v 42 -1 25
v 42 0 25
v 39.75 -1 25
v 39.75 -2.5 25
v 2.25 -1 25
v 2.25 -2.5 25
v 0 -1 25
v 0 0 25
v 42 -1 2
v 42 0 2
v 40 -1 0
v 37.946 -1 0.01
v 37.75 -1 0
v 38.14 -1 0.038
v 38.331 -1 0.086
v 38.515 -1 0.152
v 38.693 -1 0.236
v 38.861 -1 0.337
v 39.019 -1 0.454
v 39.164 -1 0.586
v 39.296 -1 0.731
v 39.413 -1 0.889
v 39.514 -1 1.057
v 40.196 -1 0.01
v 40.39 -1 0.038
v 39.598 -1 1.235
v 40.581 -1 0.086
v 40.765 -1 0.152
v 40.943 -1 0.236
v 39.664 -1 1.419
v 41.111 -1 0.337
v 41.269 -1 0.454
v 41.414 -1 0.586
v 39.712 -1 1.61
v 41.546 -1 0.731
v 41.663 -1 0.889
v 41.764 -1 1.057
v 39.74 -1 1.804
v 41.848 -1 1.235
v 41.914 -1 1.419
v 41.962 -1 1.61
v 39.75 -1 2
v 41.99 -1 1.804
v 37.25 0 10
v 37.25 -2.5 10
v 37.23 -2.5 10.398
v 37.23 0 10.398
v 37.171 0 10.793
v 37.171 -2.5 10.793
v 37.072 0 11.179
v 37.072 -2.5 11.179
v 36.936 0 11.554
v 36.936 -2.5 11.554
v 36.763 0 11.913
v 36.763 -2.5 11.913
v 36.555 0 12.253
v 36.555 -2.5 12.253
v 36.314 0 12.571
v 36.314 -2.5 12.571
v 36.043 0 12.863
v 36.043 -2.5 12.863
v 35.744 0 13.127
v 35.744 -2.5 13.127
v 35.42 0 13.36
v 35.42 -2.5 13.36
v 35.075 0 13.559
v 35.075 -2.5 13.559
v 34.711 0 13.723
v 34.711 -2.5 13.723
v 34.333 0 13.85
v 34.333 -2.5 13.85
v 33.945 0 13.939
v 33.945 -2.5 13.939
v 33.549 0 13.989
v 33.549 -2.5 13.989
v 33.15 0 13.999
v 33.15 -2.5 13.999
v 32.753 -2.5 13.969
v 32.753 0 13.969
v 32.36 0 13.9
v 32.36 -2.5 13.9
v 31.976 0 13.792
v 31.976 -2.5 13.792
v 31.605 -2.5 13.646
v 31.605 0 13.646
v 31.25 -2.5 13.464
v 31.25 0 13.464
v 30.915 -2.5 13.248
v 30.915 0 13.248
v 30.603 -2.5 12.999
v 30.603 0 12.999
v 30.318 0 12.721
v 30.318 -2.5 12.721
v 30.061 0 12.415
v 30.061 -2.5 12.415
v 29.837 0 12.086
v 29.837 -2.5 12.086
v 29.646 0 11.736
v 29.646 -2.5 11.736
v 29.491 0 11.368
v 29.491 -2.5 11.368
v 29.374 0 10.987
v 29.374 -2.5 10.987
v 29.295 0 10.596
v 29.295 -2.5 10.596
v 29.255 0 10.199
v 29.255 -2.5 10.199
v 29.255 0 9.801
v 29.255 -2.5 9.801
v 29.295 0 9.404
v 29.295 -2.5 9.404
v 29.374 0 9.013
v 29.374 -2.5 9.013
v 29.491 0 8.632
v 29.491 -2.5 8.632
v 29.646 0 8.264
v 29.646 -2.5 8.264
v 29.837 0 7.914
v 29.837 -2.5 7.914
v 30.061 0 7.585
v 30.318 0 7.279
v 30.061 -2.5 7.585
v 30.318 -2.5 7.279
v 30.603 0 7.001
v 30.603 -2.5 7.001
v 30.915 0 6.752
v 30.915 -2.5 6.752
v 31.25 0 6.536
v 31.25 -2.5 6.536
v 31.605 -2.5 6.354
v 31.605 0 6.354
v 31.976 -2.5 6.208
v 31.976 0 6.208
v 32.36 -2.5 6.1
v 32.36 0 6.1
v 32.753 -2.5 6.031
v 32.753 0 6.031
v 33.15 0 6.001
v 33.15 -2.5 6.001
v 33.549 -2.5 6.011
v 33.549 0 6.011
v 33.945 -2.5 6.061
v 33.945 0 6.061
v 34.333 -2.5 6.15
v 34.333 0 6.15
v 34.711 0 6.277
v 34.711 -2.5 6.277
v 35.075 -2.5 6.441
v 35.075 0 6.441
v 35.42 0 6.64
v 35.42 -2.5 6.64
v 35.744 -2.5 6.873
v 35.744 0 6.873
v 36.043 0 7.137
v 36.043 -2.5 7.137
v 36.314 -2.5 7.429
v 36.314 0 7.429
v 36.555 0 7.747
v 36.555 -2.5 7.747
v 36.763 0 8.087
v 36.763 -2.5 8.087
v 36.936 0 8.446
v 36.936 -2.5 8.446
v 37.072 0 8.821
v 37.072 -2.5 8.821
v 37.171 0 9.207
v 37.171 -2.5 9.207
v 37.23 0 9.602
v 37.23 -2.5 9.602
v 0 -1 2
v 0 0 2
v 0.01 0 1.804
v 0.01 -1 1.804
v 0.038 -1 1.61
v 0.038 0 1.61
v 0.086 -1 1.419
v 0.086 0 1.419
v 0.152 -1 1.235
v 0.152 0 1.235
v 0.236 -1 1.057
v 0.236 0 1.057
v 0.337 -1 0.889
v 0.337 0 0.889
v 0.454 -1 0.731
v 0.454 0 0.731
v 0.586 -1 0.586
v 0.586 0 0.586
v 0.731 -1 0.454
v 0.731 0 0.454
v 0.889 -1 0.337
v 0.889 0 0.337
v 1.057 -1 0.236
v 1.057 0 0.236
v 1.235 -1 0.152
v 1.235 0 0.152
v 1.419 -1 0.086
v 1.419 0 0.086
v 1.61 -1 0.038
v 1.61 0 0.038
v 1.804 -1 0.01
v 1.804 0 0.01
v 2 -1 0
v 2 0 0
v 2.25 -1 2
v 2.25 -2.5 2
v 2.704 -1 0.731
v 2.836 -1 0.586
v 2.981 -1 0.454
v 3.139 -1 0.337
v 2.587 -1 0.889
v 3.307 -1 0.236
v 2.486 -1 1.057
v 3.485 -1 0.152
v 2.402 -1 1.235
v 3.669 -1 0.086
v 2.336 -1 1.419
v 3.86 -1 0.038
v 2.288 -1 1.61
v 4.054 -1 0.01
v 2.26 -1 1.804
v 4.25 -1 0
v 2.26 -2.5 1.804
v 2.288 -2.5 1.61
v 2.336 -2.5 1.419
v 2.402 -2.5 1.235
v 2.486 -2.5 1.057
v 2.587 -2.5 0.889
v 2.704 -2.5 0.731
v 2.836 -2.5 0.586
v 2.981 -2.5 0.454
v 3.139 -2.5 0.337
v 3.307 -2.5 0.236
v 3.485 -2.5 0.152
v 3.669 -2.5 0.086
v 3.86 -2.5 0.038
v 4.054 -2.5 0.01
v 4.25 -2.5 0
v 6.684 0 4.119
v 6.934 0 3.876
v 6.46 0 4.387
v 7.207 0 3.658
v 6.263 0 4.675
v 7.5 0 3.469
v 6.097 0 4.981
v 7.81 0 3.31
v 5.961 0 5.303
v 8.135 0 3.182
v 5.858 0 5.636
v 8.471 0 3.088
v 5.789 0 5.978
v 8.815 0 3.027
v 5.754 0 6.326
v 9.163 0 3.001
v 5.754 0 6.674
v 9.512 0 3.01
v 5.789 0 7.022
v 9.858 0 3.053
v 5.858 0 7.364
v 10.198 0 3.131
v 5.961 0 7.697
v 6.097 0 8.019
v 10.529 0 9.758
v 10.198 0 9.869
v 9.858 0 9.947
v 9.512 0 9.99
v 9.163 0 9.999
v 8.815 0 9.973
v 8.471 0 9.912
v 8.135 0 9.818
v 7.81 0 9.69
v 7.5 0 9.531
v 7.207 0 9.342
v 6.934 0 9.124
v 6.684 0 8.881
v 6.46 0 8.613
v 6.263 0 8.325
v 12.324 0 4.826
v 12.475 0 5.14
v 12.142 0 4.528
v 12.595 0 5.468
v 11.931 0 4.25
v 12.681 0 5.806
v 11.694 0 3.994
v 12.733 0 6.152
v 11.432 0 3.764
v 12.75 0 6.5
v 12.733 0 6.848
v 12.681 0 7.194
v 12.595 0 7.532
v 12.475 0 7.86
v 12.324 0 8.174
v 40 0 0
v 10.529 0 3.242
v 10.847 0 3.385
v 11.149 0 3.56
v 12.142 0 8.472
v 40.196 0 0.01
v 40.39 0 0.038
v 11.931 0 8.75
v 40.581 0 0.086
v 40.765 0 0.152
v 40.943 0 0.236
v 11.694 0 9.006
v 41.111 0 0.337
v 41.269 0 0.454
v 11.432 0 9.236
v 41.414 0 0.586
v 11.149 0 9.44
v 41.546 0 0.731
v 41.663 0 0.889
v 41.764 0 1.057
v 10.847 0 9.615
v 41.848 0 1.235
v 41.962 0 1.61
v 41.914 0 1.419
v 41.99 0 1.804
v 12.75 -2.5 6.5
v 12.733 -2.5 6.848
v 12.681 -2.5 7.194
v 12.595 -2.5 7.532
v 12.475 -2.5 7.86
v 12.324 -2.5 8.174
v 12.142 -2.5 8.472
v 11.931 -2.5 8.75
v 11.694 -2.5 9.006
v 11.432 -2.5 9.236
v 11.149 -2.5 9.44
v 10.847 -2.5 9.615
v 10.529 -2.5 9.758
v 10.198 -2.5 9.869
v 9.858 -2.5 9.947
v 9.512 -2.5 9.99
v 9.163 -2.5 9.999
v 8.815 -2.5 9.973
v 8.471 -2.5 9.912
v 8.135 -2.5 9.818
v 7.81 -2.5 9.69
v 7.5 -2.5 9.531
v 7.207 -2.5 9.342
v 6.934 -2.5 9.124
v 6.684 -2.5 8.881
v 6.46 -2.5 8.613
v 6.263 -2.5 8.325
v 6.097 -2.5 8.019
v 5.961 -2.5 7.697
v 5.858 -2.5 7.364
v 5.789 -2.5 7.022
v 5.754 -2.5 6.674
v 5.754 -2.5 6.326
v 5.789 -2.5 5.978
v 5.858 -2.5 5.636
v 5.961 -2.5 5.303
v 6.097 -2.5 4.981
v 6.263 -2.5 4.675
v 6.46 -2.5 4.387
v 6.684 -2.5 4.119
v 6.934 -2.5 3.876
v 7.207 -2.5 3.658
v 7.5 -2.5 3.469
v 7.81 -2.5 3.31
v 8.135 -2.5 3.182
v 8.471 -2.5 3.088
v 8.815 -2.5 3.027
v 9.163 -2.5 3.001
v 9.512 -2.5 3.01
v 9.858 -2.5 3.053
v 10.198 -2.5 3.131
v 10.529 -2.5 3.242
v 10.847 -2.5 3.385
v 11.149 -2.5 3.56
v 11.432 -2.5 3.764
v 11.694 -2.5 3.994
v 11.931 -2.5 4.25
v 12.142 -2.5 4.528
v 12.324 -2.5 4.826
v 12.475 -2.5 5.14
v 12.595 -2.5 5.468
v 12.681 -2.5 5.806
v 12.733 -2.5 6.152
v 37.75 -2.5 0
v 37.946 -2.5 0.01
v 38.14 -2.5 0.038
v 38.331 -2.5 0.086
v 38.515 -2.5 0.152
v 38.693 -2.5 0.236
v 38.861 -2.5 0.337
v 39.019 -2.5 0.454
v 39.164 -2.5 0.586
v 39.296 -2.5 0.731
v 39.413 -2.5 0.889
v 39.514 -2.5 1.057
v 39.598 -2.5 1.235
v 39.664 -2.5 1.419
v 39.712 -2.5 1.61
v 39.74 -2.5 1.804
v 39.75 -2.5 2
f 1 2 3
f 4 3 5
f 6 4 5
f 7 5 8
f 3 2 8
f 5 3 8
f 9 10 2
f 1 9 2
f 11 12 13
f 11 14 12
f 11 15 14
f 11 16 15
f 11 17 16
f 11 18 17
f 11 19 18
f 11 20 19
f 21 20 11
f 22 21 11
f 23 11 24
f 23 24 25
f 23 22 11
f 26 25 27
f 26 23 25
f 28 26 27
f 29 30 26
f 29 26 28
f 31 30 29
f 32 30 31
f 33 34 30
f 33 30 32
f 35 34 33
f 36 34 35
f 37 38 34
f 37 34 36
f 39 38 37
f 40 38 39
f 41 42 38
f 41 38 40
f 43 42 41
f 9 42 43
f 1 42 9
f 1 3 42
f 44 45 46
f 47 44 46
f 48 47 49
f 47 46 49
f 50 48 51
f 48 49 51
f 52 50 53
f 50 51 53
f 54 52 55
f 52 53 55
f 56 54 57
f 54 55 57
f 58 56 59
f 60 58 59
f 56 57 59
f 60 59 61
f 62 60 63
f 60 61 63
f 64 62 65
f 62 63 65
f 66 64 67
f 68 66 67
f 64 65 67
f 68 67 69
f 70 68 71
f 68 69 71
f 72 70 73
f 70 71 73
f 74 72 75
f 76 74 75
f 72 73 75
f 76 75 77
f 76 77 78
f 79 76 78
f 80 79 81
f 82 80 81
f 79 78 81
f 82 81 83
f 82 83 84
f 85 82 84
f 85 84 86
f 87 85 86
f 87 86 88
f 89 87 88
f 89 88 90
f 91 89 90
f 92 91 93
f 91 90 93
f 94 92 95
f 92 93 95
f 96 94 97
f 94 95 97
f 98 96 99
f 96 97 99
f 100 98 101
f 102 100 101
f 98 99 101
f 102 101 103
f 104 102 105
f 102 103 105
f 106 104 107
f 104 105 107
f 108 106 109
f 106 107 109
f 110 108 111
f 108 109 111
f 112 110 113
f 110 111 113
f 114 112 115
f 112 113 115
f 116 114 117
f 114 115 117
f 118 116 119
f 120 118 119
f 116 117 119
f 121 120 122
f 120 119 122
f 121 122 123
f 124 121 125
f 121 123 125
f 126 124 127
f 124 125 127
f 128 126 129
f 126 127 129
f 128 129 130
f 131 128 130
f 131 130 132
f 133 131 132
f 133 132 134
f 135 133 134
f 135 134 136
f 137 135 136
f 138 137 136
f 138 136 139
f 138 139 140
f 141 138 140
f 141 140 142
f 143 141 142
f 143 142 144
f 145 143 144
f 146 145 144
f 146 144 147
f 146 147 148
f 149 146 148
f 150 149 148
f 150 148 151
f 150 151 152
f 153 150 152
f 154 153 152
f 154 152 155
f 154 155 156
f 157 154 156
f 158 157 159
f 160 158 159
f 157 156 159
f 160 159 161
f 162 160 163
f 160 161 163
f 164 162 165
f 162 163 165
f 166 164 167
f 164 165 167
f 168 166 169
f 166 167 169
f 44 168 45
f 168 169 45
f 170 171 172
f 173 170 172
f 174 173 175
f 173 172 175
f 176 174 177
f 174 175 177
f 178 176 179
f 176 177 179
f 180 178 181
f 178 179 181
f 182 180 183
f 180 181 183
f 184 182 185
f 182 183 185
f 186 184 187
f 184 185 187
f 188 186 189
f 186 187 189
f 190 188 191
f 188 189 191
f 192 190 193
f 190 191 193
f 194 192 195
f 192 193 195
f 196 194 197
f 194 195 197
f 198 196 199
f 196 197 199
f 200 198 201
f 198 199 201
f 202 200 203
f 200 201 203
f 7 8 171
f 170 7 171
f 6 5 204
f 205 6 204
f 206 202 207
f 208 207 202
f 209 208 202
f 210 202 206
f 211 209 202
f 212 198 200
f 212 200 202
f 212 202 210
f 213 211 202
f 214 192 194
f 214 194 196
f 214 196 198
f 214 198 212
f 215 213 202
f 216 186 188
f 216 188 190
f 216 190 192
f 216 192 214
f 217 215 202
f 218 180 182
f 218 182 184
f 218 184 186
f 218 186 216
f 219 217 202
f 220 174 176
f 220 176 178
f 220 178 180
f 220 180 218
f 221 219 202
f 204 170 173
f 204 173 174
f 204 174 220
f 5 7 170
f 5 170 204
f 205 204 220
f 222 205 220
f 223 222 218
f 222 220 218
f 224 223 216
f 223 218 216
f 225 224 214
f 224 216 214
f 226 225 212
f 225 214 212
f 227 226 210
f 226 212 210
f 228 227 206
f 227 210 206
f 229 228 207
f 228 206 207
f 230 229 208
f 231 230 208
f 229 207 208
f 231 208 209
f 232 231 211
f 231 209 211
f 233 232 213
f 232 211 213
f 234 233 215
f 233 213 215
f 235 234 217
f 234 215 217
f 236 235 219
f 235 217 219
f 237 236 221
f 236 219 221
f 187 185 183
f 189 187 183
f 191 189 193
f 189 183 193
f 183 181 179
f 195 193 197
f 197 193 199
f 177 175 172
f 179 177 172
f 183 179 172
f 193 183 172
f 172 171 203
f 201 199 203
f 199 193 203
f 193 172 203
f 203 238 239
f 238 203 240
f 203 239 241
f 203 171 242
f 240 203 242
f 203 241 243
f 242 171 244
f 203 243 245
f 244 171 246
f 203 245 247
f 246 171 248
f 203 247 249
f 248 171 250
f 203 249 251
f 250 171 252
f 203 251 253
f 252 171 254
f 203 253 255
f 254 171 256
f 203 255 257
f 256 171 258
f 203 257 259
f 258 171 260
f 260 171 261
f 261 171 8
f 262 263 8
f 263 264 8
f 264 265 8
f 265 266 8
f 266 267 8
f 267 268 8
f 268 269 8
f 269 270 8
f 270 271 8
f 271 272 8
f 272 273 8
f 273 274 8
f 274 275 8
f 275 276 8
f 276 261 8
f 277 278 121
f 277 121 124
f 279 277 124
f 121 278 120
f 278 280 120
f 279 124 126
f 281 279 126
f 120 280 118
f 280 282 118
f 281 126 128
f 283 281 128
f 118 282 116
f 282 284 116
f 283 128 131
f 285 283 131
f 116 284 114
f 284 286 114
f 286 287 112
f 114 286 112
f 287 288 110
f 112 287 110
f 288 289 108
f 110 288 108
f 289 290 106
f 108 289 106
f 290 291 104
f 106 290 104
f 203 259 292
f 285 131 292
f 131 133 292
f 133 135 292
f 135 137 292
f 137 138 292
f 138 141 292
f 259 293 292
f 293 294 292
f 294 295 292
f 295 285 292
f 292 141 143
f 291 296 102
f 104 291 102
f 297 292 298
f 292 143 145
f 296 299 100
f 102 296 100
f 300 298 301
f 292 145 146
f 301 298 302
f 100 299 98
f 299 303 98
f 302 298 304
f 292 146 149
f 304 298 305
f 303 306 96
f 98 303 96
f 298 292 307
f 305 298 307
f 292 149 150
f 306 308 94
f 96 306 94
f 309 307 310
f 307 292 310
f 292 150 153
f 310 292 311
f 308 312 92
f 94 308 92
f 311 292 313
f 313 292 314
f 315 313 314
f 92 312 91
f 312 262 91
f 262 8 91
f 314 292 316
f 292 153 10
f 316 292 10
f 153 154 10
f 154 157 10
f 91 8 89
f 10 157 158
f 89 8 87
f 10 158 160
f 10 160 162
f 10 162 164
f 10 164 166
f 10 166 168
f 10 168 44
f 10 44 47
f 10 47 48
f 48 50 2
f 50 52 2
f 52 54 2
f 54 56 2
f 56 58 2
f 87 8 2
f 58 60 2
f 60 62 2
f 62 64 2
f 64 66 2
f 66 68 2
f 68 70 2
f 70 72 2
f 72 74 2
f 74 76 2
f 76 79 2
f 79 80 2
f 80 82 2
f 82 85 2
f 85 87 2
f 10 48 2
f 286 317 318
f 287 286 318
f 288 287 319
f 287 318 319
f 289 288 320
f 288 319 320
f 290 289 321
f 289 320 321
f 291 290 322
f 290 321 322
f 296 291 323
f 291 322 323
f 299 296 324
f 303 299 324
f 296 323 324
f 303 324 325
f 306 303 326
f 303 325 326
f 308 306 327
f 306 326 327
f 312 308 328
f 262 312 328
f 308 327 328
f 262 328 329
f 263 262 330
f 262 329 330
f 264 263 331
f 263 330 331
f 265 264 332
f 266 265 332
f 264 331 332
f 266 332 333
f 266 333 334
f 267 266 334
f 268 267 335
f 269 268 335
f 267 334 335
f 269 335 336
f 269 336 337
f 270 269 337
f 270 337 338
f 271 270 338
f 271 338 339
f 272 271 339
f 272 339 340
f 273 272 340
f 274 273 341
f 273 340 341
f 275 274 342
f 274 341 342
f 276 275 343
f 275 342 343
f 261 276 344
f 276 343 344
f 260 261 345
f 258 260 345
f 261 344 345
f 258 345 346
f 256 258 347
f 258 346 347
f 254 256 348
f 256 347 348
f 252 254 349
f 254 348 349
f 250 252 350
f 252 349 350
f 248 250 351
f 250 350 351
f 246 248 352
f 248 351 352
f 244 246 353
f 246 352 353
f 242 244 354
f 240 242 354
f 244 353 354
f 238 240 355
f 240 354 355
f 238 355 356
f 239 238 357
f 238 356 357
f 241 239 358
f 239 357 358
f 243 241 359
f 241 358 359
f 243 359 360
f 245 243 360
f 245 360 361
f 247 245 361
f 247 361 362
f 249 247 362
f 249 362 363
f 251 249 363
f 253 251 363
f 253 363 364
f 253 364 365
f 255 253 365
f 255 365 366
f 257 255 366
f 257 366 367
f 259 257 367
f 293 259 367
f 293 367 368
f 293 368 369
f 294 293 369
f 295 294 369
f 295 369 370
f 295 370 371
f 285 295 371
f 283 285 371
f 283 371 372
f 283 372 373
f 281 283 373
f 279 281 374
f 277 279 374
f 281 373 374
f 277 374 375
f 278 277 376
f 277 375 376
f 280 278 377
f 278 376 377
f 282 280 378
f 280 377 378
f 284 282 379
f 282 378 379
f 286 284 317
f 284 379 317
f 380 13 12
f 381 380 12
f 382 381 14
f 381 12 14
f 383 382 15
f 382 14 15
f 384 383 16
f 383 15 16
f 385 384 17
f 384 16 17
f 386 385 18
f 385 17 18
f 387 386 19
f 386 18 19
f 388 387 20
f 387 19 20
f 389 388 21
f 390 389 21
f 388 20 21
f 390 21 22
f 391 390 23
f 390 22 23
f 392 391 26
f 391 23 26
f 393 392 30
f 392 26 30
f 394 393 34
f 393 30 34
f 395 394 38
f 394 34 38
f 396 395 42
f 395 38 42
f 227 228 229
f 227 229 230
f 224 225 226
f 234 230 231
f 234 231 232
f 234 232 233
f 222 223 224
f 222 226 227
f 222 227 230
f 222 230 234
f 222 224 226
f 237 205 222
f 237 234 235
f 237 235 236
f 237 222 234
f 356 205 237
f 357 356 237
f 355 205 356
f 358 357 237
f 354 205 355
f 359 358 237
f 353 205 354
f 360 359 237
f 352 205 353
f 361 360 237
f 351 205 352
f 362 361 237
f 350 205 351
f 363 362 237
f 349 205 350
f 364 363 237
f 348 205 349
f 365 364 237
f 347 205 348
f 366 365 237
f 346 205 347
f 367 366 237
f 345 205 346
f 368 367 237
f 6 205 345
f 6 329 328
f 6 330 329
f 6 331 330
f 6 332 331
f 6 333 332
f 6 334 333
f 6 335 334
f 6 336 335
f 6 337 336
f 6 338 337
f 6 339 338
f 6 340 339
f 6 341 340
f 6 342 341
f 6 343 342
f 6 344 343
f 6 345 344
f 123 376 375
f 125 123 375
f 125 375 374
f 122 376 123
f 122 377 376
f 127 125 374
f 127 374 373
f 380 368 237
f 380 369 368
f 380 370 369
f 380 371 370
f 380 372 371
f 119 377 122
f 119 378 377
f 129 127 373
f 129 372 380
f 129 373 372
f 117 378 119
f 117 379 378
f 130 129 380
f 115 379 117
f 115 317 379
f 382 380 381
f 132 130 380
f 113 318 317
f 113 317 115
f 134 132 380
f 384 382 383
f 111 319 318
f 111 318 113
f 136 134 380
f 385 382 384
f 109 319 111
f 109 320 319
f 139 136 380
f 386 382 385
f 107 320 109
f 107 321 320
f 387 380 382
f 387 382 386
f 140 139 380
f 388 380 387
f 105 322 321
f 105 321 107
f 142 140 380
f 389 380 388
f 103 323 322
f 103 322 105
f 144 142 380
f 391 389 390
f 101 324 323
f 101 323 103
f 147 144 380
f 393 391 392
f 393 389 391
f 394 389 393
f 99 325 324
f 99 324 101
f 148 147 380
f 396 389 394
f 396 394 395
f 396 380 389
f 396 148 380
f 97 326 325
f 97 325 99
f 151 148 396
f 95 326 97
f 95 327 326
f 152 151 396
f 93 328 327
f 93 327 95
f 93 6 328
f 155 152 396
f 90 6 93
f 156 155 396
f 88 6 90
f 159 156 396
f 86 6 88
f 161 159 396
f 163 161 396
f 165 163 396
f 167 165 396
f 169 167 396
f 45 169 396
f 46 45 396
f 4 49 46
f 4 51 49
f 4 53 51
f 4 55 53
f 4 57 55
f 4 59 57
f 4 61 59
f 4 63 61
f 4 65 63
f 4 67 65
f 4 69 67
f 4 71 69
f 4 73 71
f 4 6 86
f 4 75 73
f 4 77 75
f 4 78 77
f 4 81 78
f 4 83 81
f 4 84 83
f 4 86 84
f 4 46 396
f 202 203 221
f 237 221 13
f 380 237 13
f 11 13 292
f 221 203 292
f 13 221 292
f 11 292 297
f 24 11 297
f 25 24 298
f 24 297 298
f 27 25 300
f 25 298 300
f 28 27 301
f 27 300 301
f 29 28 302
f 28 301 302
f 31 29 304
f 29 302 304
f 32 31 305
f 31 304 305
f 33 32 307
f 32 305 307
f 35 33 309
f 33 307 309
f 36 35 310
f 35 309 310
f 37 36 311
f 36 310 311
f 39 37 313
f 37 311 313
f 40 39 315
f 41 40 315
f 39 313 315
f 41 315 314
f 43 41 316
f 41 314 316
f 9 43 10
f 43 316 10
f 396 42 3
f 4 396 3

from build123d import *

# Parameters (mm, degrees)
F1_DEPTH = 1
F3_DEPTH = 1.5
F4_R     = 4
F4_R_2   = 3.5
F5_DEPTH = 2.5


with BuildPart() as f1:
    # F0 (on Front) → F1 (new body)
    with BuildSketch(Plane.XZ):
        with BuildLine():
            ThreePointArc((0, 2), (0.5857864376, 0.5857864376), (2, 0))
            Line((2, 0), (40, 0))
            ThreePointArc((40, 0), (41.4142135624, 0.5857864376), (42, 2))
            Line((42, 2), (42, 25))
            Line((42, 25), (0, 25))
            Line((0, 25), (0, 2))
        make_face()
    extrude(amount=F1_DEPTH)

    # F2 (on face) → F3 (join)
    with BuildSketch(Plane.XZ.offset(1)):
        with BuildLine():
            Line((39.75, 25), (2.25, 25))
            Line((2.25, 25), (2.25, 2))
            ThreePointArc((2.25, 2), (2.8357864376, 0.5857864376), (4.25, 0))
            Line((4.25, 0), (37.75, 0))
            ThreePointArc((37.75, 0), (39.1642135624, 0.5857864376), (39.75, 2))
            Line((39.75, 2), (39.75, 25))
        make_face()
    extrude(amount=F3_DEPTH)

    # F4 (on face) → F5 (cut, through all)
    with BuildSketch(Plane.XZ.offset(2.5)):
        with Locations((33.25, 10)):
            Circle(F4_R)
        with Locations((9.25, 6.5)):
            Circle(F4_R_2)
    extrude(amount=-F5_DEPTH, mode=Mode.SUBTRACT)


solid = f1.part
